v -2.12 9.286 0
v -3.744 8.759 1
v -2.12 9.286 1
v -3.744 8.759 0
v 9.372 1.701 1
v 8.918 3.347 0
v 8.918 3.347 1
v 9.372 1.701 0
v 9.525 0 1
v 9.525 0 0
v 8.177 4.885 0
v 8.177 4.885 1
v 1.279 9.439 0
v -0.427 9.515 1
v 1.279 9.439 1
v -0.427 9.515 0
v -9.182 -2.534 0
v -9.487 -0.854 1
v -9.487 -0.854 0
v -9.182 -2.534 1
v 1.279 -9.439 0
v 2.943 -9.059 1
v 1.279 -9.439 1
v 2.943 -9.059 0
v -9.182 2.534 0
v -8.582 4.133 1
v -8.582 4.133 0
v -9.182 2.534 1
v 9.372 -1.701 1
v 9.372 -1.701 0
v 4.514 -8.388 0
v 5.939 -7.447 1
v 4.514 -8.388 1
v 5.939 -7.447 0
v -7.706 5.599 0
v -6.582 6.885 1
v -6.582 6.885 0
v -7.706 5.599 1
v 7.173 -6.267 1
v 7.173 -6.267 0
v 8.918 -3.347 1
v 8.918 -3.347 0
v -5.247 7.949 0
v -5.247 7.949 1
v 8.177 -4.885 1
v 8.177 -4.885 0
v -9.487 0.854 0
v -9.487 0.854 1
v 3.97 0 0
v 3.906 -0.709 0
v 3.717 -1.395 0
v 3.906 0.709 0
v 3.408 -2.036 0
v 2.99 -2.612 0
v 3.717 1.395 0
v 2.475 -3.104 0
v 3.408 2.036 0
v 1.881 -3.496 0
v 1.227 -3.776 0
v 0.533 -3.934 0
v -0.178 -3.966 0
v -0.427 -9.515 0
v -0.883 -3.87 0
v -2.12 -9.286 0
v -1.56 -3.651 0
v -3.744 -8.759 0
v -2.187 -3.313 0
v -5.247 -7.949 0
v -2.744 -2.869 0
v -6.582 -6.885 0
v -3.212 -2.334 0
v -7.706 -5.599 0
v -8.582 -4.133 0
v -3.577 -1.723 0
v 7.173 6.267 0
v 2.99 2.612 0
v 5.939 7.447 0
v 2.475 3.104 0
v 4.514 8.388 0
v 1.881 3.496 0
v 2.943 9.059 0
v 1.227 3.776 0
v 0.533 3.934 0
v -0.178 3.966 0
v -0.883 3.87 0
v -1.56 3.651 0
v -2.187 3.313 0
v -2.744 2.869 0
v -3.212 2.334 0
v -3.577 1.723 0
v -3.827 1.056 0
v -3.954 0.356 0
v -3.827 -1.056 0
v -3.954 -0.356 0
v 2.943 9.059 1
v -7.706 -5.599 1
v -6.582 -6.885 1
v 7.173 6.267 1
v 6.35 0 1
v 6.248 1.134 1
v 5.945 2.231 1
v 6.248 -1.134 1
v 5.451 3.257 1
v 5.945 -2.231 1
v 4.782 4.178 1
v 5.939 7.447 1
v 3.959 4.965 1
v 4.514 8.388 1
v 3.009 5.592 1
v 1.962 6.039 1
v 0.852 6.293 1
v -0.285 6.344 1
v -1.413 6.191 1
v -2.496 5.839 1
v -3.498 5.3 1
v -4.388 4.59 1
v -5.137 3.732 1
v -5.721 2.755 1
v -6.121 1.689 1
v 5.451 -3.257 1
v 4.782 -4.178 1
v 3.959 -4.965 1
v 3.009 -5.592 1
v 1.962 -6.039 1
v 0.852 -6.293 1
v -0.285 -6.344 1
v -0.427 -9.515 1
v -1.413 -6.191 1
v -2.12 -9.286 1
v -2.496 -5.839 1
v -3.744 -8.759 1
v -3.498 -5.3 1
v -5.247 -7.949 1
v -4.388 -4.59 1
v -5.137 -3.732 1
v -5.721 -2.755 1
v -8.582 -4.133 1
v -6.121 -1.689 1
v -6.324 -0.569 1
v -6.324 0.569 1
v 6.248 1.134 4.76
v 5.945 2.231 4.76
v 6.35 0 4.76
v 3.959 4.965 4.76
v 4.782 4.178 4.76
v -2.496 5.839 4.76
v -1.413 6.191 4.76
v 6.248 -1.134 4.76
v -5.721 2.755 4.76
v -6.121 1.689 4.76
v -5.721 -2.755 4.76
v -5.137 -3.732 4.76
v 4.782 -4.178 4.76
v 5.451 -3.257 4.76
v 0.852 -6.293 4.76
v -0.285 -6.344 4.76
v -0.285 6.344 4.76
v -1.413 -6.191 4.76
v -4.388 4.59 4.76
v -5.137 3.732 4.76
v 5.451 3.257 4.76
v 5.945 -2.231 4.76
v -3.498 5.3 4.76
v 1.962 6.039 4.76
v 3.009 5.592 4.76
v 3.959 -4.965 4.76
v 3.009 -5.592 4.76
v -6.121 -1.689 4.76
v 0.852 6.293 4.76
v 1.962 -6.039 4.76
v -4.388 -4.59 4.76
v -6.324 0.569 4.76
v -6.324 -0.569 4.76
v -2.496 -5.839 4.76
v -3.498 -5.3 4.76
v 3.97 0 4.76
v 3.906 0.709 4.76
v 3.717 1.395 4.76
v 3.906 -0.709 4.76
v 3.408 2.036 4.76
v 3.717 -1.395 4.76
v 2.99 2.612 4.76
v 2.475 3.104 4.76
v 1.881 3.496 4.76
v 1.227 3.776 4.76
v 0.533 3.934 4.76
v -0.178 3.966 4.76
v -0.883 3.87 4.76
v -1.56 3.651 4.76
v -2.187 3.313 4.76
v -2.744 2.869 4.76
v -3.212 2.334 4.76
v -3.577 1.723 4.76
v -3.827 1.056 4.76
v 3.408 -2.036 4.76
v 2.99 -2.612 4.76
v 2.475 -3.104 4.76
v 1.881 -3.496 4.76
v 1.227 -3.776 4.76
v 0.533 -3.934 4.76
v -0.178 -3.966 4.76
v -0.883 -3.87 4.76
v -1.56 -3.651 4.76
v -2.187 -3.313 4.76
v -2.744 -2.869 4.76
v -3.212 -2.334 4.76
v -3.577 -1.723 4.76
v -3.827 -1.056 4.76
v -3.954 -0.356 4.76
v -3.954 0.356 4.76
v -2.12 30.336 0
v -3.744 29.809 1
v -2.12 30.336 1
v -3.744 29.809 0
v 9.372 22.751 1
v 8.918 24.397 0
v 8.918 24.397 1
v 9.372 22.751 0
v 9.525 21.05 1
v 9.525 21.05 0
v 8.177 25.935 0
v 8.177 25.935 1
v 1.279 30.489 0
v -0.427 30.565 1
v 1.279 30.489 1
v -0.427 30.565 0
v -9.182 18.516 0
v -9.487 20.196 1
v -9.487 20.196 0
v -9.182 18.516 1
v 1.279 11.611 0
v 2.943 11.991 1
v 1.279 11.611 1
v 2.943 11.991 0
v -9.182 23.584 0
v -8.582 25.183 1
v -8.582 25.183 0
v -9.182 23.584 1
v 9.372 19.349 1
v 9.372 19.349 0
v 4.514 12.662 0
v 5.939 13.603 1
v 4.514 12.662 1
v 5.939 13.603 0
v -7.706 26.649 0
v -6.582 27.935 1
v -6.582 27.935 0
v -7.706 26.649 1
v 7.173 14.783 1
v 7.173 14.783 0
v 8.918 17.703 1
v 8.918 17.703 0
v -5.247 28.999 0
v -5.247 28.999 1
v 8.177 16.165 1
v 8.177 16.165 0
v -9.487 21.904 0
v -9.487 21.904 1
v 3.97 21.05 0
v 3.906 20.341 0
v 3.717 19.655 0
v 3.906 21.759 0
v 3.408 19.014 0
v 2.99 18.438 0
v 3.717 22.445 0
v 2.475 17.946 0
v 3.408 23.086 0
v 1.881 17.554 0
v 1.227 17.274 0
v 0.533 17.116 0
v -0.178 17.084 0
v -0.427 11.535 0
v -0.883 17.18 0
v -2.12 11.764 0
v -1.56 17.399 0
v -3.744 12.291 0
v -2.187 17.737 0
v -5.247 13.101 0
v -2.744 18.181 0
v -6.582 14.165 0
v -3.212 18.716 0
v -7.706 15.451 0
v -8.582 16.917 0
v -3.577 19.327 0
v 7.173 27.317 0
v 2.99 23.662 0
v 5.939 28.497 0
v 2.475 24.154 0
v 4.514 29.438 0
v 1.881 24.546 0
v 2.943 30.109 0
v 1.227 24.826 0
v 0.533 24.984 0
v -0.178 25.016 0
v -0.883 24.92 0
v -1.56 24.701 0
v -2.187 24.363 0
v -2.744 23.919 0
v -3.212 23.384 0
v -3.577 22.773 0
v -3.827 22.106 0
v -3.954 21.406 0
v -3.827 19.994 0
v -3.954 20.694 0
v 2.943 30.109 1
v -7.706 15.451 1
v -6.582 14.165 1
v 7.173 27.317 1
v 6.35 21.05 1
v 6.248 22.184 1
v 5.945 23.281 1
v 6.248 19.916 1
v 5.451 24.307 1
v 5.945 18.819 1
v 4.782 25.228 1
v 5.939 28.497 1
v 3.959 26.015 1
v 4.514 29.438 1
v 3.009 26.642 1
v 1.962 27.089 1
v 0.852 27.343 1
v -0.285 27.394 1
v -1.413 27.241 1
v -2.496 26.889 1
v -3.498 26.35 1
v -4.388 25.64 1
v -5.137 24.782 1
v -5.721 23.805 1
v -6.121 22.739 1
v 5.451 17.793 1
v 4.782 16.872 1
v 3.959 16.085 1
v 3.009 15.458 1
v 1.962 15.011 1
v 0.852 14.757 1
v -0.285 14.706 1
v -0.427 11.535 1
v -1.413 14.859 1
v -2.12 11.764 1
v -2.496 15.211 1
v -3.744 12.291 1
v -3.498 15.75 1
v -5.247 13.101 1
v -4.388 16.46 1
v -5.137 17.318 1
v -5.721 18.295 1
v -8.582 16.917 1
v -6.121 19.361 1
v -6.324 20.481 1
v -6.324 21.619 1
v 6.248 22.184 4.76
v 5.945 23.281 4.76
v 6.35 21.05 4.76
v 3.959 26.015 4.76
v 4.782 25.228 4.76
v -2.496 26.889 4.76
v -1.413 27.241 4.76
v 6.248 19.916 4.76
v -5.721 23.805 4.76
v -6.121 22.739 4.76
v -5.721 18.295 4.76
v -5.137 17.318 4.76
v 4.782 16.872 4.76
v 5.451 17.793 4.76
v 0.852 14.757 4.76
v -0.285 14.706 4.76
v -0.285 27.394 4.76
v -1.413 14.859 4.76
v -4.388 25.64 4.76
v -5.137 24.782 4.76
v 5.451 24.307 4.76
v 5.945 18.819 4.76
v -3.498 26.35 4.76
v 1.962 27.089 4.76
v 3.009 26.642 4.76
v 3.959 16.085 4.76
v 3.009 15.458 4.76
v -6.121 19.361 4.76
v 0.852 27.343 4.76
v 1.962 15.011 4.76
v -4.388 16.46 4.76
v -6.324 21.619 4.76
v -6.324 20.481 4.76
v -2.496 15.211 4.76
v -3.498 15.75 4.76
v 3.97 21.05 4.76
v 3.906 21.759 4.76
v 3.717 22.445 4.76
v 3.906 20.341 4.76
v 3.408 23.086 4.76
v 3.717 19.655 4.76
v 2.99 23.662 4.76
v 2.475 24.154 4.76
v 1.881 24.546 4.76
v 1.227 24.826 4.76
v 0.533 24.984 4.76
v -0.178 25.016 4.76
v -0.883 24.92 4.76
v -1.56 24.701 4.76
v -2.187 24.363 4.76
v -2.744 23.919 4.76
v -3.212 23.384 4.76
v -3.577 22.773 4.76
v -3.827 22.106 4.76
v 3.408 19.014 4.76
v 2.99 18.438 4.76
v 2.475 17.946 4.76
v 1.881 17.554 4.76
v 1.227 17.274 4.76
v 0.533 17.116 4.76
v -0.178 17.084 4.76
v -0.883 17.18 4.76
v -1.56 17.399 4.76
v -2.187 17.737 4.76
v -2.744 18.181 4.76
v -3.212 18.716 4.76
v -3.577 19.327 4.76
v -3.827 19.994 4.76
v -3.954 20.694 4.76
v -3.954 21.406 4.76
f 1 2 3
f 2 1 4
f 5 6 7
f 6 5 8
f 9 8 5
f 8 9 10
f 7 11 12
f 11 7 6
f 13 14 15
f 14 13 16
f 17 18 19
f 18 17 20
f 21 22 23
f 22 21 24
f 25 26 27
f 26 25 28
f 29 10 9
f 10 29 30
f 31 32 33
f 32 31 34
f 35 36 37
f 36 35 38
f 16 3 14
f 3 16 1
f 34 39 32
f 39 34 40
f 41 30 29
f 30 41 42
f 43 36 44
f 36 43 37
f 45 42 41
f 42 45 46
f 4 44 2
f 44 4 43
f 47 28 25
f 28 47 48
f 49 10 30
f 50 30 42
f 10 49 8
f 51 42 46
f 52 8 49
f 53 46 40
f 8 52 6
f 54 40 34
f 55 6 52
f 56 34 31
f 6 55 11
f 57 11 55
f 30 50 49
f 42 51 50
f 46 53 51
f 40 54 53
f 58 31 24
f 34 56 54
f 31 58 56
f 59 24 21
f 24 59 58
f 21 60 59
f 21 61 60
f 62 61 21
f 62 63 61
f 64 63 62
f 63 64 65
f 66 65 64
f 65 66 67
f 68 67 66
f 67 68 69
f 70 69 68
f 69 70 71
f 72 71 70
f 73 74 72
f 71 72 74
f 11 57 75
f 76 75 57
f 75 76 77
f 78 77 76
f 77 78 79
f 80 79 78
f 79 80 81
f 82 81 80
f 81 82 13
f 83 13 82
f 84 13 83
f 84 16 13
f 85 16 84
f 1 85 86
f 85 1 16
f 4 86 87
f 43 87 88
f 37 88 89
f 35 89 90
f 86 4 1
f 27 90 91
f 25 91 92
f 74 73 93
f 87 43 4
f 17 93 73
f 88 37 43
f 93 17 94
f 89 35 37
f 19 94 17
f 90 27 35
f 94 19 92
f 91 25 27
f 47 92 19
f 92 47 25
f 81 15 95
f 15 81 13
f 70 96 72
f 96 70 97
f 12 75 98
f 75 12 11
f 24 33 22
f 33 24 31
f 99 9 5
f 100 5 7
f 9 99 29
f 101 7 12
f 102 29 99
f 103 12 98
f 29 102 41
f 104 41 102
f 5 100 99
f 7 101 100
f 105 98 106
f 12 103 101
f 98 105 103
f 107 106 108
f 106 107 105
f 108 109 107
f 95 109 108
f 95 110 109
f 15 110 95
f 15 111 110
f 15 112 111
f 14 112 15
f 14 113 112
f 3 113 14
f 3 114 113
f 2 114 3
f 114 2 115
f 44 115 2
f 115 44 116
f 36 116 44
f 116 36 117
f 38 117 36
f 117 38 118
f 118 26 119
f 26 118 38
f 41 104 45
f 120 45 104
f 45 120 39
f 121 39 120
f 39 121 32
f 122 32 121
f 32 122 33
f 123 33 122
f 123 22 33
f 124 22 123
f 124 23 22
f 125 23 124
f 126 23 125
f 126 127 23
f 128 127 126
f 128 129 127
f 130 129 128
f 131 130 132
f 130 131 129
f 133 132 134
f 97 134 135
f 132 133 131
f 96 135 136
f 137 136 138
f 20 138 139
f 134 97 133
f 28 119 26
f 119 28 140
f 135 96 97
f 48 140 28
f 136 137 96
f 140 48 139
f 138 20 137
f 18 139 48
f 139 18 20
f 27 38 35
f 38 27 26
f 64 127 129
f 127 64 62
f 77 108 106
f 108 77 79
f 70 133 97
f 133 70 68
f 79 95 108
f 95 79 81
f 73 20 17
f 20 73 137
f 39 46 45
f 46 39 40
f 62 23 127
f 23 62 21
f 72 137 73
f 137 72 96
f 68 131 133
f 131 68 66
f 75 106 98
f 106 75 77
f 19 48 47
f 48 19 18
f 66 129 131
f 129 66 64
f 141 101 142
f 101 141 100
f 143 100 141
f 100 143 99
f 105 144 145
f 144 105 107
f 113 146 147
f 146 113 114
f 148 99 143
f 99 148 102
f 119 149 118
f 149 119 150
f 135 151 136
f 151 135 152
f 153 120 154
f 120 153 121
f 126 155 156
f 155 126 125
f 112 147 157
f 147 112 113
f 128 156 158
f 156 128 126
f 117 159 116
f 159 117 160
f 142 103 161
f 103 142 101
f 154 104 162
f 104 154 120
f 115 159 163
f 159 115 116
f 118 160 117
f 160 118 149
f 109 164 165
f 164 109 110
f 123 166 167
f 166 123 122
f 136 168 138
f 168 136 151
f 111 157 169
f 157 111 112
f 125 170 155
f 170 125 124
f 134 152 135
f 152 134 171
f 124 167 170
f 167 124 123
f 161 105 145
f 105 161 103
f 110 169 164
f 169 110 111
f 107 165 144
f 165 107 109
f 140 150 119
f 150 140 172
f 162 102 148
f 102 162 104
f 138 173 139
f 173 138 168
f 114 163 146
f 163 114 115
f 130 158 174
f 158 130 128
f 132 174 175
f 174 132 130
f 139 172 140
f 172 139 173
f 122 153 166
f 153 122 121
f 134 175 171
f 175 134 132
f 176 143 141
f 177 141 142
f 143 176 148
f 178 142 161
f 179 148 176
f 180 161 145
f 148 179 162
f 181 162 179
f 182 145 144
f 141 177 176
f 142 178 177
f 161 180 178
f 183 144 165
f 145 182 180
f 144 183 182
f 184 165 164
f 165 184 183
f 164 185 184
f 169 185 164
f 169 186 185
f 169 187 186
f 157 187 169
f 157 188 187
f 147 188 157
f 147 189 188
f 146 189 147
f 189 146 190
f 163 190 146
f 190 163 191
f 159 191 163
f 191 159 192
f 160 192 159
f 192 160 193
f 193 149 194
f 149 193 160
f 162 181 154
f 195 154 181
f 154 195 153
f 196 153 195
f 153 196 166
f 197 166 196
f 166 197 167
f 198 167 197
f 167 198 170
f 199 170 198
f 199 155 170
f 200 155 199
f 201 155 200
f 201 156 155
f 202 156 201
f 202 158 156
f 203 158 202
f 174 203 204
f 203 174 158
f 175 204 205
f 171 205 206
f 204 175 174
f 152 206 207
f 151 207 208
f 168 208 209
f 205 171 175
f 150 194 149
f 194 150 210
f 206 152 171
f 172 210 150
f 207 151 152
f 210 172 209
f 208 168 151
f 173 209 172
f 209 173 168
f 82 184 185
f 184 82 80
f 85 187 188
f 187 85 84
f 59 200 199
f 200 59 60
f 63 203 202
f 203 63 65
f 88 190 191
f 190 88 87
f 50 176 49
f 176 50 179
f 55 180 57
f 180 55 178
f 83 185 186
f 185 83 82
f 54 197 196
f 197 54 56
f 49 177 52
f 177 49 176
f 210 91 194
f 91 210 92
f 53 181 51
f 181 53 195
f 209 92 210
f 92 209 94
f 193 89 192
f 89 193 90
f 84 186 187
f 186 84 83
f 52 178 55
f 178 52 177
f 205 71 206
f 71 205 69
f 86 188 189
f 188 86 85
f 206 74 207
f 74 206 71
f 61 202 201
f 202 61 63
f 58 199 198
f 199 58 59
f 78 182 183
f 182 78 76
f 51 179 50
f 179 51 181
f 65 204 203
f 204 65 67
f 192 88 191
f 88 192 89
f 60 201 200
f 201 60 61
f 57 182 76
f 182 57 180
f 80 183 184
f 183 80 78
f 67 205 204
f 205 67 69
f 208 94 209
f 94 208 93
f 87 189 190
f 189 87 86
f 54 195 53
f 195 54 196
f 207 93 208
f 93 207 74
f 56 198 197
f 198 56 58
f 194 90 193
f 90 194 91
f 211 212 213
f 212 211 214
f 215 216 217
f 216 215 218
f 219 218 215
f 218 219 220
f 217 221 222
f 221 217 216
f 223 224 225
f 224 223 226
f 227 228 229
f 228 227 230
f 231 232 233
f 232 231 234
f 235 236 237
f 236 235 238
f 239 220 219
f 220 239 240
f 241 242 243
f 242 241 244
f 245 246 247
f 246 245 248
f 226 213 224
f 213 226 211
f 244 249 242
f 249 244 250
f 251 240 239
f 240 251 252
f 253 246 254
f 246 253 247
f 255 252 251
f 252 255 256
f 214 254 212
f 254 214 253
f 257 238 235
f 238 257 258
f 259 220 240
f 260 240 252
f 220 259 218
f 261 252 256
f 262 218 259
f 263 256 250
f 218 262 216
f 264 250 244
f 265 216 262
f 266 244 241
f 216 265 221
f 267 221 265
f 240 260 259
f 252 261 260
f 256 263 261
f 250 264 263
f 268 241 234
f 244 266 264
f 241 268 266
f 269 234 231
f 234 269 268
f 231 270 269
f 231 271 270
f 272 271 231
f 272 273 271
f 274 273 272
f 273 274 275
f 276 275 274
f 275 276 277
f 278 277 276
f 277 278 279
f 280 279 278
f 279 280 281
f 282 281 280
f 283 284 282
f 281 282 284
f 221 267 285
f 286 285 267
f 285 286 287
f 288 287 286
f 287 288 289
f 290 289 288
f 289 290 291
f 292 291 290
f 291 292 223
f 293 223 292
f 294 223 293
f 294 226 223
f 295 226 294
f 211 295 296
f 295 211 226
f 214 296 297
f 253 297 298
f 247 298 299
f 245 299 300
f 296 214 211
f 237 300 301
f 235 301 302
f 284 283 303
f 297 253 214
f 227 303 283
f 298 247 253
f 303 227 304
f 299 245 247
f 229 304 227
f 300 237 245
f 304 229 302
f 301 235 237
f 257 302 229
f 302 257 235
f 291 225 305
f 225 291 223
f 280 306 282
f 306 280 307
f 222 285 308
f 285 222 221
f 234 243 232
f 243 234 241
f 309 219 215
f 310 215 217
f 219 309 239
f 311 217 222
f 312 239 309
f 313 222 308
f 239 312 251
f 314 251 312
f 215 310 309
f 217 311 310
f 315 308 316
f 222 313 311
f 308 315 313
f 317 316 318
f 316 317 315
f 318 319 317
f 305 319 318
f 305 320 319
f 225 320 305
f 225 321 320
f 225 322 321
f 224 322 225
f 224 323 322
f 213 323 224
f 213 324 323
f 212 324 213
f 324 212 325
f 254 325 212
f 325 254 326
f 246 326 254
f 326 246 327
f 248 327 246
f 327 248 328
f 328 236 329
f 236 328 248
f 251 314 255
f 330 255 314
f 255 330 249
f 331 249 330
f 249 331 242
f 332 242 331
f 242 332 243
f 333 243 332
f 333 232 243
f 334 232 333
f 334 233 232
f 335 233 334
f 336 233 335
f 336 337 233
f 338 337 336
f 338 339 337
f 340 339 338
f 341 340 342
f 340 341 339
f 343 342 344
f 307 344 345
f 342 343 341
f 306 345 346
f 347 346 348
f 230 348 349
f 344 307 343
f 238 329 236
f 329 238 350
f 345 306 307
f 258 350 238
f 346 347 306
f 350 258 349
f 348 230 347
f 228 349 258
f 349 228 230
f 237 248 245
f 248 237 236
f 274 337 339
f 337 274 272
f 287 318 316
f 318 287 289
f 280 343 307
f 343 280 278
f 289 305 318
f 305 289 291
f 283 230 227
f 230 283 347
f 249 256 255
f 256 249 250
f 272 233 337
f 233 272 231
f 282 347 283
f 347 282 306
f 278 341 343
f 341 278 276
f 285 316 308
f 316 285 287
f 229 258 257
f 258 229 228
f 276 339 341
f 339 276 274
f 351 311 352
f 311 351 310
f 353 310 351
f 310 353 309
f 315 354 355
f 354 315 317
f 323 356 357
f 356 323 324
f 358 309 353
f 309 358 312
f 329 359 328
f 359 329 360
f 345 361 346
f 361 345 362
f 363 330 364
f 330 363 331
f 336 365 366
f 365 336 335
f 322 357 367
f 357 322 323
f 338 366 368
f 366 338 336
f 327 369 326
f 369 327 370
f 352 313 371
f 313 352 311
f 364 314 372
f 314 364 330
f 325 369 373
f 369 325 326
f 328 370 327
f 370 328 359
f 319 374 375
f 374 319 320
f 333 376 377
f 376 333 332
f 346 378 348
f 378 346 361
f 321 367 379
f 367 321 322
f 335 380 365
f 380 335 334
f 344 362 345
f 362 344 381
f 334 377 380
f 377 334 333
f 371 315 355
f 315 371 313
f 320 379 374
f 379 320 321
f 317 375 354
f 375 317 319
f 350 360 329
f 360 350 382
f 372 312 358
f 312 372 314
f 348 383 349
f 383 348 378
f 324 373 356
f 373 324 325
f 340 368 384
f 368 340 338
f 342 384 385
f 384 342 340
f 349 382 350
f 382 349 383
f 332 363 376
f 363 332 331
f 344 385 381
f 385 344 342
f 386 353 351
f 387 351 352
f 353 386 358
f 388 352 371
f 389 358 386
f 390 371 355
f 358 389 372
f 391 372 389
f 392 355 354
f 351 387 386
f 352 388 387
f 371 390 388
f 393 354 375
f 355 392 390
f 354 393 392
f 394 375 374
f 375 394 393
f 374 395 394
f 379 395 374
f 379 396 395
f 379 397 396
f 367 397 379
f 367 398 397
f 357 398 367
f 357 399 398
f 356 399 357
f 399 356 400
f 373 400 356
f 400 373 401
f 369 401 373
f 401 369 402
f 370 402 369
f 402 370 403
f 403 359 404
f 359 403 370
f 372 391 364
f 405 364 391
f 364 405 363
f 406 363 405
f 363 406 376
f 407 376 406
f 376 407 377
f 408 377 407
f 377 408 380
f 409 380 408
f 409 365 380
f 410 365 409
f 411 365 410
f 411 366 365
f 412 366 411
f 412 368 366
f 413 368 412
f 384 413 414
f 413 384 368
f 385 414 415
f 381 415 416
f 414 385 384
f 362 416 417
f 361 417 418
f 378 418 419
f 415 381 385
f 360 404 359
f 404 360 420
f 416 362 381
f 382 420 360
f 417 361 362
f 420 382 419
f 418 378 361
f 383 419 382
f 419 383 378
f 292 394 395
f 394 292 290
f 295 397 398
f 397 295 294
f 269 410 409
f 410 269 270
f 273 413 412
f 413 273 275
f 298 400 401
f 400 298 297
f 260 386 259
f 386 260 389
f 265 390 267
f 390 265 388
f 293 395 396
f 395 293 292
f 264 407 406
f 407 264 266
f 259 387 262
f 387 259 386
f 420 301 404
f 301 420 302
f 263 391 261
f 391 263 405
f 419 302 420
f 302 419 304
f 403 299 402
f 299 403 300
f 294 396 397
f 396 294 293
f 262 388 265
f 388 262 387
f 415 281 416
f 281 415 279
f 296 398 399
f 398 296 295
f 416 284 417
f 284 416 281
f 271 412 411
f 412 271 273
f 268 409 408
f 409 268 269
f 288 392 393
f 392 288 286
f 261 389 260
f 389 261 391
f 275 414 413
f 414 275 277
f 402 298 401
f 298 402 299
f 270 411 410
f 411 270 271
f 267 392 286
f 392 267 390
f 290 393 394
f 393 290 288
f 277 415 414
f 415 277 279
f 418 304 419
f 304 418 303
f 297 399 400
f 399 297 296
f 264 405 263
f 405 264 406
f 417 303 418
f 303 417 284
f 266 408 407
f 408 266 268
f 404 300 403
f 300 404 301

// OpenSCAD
//How many do you need?
number = 2; //[1:10]
base_diameter = 19.05;
//
base_height = 1;//[.8:.2:2]
//
bushing_height = 4.76;
//
bushing_external_diamter = 12.7;
//
bushing_internal_diameter = 7.94;

columnas = sqrt(number);
for (i= [1:number]){
  translate([(2+base_diameter)*floor((i-1)/columnas),  (2+base_diameter)*floor((i-1)%columnas), 0]) buje(bushing_height);
    echo (floor(i/columnas));
}

//translate([20,0,0])buje(25.4);
//translate([0,20,0]){
//  buje(7.94);
//  translate([20,0,0])buje(25.4);
//}
module buje(h){
  difference(){
    union(){
      cylinder(d=base_diameter, h=base_height, $fn=35);
      cylinder(d=bushing_external_diamter, h=h, $fn=35);
    }
    cylinder(d=bushing_internal_diameter, h=h, $fn=35);
  }
}
